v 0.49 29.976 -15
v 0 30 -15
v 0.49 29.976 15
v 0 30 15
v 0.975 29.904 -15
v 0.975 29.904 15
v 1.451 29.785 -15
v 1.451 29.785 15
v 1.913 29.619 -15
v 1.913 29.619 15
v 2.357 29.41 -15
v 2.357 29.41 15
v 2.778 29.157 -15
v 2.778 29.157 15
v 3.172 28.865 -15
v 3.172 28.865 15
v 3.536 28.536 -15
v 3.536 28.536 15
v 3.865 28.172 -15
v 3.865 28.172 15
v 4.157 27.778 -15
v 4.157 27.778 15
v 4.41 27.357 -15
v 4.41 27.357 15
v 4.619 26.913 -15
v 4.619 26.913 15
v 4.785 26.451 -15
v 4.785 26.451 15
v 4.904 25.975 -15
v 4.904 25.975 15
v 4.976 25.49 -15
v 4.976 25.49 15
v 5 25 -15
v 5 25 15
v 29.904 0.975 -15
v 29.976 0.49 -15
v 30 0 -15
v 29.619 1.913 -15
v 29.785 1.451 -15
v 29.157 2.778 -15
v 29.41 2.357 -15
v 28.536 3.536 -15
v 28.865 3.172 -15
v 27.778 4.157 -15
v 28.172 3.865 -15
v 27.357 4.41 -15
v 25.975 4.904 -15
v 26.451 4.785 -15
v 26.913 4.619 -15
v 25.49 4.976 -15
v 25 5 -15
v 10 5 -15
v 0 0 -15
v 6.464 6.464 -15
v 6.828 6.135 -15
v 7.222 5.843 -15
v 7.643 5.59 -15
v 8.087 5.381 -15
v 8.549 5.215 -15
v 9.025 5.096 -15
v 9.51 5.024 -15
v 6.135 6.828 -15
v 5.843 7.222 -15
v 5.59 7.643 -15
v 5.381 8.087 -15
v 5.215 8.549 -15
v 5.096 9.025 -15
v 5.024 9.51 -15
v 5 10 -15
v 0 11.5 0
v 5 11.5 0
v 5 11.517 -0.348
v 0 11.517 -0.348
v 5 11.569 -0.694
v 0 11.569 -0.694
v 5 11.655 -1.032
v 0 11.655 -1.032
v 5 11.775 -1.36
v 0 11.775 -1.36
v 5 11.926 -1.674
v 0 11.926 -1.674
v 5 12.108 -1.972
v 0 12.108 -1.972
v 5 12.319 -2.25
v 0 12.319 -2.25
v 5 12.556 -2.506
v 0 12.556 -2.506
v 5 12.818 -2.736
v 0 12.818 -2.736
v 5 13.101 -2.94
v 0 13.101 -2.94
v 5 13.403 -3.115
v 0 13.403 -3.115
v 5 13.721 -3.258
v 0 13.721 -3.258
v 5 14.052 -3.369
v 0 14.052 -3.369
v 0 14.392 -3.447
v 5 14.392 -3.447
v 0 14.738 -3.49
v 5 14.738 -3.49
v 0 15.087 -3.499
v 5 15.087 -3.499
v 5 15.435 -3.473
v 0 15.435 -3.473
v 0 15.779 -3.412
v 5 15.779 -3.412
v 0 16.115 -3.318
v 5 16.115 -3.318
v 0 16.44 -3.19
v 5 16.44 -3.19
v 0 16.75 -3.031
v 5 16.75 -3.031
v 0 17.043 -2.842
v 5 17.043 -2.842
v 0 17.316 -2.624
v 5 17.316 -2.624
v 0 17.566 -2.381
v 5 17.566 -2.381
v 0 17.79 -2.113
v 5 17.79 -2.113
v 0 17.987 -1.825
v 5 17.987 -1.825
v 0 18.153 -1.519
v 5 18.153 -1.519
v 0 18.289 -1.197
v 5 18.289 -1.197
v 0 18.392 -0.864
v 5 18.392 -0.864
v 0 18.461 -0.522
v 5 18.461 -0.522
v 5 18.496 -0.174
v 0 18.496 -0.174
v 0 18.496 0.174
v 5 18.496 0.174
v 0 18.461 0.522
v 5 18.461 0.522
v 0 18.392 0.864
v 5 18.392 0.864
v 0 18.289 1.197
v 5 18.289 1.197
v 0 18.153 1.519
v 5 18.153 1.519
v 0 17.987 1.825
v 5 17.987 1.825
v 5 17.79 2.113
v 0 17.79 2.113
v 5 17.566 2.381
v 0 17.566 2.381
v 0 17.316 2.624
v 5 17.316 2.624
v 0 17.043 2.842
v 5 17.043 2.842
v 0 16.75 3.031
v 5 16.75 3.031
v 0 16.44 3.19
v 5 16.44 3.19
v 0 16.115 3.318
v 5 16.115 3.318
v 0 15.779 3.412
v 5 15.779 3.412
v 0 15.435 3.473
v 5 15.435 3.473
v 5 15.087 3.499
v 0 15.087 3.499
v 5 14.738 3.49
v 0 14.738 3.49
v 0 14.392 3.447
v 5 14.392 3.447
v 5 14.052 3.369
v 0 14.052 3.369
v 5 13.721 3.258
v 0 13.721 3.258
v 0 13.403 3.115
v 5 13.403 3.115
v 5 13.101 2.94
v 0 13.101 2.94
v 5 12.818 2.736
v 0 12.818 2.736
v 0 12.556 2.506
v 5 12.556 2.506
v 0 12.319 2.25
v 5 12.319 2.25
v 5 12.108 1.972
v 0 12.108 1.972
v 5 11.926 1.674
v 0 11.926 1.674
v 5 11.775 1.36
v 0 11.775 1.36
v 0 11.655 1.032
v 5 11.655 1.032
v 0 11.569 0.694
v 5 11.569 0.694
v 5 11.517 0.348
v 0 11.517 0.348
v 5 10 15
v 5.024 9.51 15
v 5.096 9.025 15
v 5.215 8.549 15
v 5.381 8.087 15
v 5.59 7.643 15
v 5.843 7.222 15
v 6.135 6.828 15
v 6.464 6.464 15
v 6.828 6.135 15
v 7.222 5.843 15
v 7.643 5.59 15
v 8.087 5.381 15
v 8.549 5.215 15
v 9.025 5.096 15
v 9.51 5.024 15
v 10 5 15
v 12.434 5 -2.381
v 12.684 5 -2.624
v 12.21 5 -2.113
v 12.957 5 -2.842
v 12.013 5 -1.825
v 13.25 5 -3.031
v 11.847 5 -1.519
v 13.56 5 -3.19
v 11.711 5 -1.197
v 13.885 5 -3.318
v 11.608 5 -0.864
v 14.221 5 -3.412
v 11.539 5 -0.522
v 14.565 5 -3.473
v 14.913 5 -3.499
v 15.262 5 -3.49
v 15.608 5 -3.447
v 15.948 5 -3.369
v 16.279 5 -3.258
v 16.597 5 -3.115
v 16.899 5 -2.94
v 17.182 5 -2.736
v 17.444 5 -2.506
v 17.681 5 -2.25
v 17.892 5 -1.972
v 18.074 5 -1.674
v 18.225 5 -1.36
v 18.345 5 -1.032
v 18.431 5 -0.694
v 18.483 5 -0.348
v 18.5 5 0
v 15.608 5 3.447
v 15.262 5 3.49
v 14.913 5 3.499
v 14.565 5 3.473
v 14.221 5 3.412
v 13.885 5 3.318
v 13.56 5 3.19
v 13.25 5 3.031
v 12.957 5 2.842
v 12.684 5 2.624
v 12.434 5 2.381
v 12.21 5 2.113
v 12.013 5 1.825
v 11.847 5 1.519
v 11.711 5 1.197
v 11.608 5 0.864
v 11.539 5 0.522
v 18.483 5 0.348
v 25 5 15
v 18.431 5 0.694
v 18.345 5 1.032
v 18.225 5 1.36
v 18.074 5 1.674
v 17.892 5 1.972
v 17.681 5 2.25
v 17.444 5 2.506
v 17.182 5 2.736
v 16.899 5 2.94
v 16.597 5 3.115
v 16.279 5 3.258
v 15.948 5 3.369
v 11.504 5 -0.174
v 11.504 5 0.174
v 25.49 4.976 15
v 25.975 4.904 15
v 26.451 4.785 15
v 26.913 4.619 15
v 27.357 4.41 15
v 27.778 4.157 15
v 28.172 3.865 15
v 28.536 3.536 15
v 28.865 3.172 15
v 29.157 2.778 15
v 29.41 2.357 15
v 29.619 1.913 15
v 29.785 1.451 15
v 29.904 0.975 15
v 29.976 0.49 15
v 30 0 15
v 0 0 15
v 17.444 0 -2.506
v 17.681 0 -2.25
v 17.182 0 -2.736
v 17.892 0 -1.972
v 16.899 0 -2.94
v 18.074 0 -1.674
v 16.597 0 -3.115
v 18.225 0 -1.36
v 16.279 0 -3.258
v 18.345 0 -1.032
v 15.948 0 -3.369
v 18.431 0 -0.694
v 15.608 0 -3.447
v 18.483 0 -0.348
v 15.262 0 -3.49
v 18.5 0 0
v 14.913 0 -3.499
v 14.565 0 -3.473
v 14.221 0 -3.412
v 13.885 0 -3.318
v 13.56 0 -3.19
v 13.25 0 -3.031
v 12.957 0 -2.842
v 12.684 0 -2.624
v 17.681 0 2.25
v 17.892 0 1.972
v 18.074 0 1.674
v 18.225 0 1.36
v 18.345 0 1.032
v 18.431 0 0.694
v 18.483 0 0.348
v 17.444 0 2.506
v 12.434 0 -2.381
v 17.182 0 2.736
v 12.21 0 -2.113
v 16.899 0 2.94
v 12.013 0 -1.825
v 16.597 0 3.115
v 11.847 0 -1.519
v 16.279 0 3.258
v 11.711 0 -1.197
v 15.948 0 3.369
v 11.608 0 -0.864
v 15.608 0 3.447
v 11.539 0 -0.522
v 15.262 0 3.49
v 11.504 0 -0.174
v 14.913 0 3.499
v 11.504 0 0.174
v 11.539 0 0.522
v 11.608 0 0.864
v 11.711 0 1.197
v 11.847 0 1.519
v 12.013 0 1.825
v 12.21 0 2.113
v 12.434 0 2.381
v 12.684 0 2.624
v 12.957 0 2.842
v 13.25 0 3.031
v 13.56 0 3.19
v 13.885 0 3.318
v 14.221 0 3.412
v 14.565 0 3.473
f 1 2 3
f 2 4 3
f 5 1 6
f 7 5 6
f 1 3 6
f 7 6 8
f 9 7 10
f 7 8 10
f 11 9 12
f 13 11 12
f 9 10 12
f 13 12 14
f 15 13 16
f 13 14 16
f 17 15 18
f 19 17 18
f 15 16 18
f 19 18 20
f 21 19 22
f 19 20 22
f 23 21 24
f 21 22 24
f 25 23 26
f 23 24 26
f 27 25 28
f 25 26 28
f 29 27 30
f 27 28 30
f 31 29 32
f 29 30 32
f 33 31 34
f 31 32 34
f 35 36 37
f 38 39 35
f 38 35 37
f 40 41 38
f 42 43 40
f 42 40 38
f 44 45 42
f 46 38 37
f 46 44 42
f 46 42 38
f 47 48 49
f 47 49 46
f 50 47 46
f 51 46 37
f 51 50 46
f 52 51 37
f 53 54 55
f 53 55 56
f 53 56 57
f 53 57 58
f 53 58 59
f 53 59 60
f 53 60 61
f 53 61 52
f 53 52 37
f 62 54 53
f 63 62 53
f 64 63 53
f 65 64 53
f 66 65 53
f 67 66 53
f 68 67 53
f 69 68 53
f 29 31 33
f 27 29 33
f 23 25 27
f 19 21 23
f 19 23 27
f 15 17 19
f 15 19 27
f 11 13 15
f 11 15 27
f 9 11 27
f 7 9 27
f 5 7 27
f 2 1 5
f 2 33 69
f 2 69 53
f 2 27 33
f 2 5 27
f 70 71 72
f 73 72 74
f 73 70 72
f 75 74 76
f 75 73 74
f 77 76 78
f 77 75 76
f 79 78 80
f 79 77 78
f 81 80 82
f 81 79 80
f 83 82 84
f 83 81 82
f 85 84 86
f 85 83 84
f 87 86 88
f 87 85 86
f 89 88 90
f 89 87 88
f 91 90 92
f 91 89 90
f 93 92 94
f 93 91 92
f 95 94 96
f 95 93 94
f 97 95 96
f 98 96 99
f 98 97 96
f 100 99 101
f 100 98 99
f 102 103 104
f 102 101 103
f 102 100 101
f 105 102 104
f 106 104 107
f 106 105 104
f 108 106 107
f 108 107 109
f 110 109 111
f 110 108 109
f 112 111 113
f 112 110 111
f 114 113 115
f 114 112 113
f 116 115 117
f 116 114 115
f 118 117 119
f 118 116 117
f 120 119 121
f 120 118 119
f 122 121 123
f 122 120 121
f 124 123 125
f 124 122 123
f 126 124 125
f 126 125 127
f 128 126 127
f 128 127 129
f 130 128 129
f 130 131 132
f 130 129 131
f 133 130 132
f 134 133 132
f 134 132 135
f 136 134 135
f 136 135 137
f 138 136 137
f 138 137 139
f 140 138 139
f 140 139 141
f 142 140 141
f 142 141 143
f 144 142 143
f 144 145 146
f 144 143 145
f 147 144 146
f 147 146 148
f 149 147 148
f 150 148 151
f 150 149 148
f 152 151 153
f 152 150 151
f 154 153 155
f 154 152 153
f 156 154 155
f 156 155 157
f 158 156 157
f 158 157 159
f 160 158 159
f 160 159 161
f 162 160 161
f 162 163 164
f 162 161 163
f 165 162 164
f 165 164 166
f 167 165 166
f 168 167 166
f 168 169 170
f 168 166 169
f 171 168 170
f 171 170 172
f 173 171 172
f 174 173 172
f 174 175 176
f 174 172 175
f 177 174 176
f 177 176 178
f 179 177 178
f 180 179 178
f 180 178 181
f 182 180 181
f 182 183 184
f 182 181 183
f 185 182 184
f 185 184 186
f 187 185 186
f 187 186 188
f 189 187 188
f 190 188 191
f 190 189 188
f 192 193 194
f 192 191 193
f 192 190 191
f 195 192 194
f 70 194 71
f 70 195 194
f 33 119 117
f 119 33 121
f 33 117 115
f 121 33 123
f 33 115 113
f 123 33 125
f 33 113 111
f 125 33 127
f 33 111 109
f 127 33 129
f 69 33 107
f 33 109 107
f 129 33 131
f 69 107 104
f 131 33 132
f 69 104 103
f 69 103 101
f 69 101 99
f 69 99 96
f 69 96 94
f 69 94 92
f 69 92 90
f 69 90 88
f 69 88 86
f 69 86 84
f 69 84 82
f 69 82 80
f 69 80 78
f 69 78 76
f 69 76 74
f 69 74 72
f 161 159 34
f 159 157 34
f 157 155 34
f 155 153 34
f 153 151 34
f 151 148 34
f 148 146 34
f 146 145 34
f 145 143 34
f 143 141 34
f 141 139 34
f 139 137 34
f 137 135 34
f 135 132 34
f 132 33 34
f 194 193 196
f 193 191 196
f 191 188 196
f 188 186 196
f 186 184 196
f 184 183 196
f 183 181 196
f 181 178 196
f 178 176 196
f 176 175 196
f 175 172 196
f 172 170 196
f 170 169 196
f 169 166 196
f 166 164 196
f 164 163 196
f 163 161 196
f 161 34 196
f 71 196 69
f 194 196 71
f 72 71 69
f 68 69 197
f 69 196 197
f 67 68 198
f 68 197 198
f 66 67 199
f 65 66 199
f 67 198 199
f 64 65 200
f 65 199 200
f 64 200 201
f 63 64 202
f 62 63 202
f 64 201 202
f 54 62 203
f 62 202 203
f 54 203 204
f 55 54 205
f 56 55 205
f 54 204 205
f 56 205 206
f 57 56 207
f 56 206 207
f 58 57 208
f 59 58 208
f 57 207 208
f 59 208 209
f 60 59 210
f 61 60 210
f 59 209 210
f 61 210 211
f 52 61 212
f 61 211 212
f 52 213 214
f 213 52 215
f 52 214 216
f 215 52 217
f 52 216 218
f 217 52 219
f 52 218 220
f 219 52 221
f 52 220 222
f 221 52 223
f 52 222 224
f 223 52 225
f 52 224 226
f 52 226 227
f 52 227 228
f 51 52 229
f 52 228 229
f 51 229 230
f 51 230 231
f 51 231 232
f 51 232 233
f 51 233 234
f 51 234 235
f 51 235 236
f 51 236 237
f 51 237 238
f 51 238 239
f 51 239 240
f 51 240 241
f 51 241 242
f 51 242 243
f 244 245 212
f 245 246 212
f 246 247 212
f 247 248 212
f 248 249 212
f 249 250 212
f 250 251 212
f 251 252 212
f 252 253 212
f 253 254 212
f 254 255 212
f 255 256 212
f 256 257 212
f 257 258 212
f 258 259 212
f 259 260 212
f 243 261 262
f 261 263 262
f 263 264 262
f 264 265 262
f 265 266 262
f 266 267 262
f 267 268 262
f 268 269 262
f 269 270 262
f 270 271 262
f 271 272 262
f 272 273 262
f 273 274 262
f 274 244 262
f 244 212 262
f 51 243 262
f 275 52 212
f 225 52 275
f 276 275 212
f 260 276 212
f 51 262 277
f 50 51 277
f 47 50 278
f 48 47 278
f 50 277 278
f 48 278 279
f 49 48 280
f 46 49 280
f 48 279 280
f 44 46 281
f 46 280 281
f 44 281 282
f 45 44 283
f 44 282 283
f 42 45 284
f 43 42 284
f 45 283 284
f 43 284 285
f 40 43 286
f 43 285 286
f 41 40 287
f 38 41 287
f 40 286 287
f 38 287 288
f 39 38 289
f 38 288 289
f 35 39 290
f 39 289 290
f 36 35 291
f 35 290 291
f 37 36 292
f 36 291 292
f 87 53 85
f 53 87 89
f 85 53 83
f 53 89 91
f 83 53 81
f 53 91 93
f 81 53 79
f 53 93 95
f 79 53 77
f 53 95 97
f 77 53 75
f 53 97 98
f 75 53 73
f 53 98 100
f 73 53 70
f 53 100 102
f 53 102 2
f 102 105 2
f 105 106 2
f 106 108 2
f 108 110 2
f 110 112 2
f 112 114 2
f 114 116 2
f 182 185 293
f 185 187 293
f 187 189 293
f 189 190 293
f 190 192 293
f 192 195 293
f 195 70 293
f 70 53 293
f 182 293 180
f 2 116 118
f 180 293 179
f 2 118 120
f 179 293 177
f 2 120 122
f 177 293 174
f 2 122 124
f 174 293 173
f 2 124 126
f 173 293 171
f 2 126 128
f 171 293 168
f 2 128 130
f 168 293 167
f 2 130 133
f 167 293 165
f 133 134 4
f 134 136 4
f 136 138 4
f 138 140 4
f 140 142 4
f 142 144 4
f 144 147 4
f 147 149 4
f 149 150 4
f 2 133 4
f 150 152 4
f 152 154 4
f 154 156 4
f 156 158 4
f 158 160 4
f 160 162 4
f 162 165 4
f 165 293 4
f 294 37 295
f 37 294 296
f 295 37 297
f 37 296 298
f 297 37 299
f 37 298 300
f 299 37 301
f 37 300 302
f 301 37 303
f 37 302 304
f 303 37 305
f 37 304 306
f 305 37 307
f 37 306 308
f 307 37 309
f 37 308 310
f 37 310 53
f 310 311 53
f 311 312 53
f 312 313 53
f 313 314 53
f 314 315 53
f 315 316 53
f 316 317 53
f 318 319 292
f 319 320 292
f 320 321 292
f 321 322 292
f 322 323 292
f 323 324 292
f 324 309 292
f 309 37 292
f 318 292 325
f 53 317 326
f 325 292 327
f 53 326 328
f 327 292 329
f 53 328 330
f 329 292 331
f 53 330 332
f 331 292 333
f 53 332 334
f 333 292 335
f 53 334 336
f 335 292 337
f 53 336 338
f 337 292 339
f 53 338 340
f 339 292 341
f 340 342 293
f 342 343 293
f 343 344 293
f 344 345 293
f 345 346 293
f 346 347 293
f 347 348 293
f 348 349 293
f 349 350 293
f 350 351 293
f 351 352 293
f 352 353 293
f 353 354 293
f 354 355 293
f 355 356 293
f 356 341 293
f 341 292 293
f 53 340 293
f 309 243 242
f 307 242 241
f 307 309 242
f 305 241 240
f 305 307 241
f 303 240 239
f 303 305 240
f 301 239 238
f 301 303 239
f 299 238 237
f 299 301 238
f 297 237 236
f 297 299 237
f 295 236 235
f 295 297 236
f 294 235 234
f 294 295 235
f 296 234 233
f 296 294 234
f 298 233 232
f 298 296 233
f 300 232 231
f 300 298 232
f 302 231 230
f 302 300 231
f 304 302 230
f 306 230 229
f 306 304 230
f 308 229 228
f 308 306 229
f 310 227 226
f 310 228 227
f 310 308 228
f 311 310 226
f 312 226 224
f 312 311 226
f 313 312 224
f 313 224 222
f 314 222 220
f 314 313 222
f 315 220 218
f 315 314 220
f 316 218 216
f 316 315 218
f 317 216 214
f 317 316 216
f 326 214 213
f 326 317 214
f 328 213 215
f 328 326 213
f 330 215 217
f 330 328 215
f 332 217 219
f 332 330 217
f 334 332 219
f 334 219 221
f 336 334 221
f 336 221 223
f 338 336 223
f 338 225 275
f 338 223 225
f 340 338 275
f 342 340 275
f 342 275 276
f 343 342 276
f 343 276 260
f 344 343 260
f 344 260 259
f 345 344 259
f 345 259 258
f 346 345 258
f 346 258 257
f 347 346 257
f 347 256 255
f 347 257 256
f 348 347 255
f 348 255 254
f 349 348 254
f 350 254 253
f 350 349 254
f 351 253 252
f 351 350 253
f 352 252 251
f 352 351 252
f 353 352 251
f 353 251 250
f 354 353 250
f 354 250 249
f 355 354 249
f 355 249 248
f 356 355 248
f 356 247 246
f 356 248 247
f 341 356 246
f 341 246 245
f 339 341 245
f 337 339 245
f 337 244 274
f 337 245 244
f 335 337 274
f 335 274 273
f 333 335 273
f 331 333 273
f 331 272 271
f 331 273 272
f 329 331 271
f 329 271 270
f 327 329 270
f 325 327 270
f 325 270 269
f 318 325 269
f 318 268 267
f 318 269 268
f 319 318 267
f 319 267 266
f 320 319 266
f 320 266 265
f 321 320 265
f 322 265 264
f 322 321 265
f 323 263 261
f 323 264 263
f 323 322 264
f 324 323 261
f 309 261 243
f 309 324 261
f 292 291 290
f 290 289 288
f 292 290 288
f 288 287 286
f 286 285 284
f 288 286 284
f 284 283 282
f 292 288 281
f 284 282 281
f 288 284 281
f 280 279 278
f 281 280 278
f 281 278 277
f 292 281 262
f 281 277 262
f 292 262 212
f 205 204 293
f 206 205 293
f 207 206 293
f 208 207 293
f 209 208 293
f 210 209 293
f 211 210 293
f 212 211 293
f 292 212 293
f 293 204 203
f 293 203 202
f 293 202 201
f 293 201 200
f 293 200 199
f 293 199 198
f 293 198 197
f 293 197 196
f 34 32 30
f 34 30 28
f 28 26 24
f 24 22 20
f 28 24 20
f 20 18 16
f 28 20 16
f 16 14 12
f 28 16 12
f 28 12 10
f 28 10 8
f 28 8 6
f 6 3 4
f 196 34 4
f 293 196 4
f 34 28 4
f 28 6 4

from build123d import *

# Parameters (mm, degrees)
BOSS_EXTRUDE1_DEPTH = 15
SKETCH2_R           = 3.5
CUT_EXTRUDE1_DEPTH  = 46
SKETCH3_R           = 3.5
CUT_EXTRUDE2_DEPTH  = 46


with BuildPart() as part:
    # Sketch1 → Boss-Extrude1 (new, symmetric)
    with BuildSketch(Plane.XY):
        with BuildLine():
            Line((0, 0), (0, 30))
            ThreePointArc((0, 30), (3.535533906, 28.535533906), (5, 25))
            Line((5, 25), (5, 10))
            ThreePointArc((5, 10), (6.464466094, 6.464466094), (10, 5))
            Line((10, 5), (25, 5))
            ThreePointArc((25, 5), (28.535533906, 3.535533906), (30, 0))
            Line((30, 0), (0, 0))
        make_face()
    extrude(amount=BOSS_EXTRUDE1_DEPTH, both=True)

    # Sketch2 → Cut-Extrude1 (cut, through all)
    with BuildSketch(Plane(origin=(0, 0, 0), x_dir=(1, 0, 0), z_dir=(0, 1, 0))):
        with Locations((15, 0)):
            Circle(SKETCH2_R)
    extrude(amount=CUT_EXTRUDE1_DEPTH, mode=Mode.SUBTRACT)

    # Sketch3 → Cut-Extrude2 (cut, through all)
    with BuildSketch(Plane(origin=(0, 0, 0), x_dir=(0, 0, -1), z_dir=(1, 0, 0))):
        with Locations(Location((0, 15, 0), (0, 0, 270))):
            Circle(SKETCH3_R)
    extrude(amount=CUT_EXTRUDE2_DEPTH, mode=Mode.SUBTRACT)


solid = part.part
